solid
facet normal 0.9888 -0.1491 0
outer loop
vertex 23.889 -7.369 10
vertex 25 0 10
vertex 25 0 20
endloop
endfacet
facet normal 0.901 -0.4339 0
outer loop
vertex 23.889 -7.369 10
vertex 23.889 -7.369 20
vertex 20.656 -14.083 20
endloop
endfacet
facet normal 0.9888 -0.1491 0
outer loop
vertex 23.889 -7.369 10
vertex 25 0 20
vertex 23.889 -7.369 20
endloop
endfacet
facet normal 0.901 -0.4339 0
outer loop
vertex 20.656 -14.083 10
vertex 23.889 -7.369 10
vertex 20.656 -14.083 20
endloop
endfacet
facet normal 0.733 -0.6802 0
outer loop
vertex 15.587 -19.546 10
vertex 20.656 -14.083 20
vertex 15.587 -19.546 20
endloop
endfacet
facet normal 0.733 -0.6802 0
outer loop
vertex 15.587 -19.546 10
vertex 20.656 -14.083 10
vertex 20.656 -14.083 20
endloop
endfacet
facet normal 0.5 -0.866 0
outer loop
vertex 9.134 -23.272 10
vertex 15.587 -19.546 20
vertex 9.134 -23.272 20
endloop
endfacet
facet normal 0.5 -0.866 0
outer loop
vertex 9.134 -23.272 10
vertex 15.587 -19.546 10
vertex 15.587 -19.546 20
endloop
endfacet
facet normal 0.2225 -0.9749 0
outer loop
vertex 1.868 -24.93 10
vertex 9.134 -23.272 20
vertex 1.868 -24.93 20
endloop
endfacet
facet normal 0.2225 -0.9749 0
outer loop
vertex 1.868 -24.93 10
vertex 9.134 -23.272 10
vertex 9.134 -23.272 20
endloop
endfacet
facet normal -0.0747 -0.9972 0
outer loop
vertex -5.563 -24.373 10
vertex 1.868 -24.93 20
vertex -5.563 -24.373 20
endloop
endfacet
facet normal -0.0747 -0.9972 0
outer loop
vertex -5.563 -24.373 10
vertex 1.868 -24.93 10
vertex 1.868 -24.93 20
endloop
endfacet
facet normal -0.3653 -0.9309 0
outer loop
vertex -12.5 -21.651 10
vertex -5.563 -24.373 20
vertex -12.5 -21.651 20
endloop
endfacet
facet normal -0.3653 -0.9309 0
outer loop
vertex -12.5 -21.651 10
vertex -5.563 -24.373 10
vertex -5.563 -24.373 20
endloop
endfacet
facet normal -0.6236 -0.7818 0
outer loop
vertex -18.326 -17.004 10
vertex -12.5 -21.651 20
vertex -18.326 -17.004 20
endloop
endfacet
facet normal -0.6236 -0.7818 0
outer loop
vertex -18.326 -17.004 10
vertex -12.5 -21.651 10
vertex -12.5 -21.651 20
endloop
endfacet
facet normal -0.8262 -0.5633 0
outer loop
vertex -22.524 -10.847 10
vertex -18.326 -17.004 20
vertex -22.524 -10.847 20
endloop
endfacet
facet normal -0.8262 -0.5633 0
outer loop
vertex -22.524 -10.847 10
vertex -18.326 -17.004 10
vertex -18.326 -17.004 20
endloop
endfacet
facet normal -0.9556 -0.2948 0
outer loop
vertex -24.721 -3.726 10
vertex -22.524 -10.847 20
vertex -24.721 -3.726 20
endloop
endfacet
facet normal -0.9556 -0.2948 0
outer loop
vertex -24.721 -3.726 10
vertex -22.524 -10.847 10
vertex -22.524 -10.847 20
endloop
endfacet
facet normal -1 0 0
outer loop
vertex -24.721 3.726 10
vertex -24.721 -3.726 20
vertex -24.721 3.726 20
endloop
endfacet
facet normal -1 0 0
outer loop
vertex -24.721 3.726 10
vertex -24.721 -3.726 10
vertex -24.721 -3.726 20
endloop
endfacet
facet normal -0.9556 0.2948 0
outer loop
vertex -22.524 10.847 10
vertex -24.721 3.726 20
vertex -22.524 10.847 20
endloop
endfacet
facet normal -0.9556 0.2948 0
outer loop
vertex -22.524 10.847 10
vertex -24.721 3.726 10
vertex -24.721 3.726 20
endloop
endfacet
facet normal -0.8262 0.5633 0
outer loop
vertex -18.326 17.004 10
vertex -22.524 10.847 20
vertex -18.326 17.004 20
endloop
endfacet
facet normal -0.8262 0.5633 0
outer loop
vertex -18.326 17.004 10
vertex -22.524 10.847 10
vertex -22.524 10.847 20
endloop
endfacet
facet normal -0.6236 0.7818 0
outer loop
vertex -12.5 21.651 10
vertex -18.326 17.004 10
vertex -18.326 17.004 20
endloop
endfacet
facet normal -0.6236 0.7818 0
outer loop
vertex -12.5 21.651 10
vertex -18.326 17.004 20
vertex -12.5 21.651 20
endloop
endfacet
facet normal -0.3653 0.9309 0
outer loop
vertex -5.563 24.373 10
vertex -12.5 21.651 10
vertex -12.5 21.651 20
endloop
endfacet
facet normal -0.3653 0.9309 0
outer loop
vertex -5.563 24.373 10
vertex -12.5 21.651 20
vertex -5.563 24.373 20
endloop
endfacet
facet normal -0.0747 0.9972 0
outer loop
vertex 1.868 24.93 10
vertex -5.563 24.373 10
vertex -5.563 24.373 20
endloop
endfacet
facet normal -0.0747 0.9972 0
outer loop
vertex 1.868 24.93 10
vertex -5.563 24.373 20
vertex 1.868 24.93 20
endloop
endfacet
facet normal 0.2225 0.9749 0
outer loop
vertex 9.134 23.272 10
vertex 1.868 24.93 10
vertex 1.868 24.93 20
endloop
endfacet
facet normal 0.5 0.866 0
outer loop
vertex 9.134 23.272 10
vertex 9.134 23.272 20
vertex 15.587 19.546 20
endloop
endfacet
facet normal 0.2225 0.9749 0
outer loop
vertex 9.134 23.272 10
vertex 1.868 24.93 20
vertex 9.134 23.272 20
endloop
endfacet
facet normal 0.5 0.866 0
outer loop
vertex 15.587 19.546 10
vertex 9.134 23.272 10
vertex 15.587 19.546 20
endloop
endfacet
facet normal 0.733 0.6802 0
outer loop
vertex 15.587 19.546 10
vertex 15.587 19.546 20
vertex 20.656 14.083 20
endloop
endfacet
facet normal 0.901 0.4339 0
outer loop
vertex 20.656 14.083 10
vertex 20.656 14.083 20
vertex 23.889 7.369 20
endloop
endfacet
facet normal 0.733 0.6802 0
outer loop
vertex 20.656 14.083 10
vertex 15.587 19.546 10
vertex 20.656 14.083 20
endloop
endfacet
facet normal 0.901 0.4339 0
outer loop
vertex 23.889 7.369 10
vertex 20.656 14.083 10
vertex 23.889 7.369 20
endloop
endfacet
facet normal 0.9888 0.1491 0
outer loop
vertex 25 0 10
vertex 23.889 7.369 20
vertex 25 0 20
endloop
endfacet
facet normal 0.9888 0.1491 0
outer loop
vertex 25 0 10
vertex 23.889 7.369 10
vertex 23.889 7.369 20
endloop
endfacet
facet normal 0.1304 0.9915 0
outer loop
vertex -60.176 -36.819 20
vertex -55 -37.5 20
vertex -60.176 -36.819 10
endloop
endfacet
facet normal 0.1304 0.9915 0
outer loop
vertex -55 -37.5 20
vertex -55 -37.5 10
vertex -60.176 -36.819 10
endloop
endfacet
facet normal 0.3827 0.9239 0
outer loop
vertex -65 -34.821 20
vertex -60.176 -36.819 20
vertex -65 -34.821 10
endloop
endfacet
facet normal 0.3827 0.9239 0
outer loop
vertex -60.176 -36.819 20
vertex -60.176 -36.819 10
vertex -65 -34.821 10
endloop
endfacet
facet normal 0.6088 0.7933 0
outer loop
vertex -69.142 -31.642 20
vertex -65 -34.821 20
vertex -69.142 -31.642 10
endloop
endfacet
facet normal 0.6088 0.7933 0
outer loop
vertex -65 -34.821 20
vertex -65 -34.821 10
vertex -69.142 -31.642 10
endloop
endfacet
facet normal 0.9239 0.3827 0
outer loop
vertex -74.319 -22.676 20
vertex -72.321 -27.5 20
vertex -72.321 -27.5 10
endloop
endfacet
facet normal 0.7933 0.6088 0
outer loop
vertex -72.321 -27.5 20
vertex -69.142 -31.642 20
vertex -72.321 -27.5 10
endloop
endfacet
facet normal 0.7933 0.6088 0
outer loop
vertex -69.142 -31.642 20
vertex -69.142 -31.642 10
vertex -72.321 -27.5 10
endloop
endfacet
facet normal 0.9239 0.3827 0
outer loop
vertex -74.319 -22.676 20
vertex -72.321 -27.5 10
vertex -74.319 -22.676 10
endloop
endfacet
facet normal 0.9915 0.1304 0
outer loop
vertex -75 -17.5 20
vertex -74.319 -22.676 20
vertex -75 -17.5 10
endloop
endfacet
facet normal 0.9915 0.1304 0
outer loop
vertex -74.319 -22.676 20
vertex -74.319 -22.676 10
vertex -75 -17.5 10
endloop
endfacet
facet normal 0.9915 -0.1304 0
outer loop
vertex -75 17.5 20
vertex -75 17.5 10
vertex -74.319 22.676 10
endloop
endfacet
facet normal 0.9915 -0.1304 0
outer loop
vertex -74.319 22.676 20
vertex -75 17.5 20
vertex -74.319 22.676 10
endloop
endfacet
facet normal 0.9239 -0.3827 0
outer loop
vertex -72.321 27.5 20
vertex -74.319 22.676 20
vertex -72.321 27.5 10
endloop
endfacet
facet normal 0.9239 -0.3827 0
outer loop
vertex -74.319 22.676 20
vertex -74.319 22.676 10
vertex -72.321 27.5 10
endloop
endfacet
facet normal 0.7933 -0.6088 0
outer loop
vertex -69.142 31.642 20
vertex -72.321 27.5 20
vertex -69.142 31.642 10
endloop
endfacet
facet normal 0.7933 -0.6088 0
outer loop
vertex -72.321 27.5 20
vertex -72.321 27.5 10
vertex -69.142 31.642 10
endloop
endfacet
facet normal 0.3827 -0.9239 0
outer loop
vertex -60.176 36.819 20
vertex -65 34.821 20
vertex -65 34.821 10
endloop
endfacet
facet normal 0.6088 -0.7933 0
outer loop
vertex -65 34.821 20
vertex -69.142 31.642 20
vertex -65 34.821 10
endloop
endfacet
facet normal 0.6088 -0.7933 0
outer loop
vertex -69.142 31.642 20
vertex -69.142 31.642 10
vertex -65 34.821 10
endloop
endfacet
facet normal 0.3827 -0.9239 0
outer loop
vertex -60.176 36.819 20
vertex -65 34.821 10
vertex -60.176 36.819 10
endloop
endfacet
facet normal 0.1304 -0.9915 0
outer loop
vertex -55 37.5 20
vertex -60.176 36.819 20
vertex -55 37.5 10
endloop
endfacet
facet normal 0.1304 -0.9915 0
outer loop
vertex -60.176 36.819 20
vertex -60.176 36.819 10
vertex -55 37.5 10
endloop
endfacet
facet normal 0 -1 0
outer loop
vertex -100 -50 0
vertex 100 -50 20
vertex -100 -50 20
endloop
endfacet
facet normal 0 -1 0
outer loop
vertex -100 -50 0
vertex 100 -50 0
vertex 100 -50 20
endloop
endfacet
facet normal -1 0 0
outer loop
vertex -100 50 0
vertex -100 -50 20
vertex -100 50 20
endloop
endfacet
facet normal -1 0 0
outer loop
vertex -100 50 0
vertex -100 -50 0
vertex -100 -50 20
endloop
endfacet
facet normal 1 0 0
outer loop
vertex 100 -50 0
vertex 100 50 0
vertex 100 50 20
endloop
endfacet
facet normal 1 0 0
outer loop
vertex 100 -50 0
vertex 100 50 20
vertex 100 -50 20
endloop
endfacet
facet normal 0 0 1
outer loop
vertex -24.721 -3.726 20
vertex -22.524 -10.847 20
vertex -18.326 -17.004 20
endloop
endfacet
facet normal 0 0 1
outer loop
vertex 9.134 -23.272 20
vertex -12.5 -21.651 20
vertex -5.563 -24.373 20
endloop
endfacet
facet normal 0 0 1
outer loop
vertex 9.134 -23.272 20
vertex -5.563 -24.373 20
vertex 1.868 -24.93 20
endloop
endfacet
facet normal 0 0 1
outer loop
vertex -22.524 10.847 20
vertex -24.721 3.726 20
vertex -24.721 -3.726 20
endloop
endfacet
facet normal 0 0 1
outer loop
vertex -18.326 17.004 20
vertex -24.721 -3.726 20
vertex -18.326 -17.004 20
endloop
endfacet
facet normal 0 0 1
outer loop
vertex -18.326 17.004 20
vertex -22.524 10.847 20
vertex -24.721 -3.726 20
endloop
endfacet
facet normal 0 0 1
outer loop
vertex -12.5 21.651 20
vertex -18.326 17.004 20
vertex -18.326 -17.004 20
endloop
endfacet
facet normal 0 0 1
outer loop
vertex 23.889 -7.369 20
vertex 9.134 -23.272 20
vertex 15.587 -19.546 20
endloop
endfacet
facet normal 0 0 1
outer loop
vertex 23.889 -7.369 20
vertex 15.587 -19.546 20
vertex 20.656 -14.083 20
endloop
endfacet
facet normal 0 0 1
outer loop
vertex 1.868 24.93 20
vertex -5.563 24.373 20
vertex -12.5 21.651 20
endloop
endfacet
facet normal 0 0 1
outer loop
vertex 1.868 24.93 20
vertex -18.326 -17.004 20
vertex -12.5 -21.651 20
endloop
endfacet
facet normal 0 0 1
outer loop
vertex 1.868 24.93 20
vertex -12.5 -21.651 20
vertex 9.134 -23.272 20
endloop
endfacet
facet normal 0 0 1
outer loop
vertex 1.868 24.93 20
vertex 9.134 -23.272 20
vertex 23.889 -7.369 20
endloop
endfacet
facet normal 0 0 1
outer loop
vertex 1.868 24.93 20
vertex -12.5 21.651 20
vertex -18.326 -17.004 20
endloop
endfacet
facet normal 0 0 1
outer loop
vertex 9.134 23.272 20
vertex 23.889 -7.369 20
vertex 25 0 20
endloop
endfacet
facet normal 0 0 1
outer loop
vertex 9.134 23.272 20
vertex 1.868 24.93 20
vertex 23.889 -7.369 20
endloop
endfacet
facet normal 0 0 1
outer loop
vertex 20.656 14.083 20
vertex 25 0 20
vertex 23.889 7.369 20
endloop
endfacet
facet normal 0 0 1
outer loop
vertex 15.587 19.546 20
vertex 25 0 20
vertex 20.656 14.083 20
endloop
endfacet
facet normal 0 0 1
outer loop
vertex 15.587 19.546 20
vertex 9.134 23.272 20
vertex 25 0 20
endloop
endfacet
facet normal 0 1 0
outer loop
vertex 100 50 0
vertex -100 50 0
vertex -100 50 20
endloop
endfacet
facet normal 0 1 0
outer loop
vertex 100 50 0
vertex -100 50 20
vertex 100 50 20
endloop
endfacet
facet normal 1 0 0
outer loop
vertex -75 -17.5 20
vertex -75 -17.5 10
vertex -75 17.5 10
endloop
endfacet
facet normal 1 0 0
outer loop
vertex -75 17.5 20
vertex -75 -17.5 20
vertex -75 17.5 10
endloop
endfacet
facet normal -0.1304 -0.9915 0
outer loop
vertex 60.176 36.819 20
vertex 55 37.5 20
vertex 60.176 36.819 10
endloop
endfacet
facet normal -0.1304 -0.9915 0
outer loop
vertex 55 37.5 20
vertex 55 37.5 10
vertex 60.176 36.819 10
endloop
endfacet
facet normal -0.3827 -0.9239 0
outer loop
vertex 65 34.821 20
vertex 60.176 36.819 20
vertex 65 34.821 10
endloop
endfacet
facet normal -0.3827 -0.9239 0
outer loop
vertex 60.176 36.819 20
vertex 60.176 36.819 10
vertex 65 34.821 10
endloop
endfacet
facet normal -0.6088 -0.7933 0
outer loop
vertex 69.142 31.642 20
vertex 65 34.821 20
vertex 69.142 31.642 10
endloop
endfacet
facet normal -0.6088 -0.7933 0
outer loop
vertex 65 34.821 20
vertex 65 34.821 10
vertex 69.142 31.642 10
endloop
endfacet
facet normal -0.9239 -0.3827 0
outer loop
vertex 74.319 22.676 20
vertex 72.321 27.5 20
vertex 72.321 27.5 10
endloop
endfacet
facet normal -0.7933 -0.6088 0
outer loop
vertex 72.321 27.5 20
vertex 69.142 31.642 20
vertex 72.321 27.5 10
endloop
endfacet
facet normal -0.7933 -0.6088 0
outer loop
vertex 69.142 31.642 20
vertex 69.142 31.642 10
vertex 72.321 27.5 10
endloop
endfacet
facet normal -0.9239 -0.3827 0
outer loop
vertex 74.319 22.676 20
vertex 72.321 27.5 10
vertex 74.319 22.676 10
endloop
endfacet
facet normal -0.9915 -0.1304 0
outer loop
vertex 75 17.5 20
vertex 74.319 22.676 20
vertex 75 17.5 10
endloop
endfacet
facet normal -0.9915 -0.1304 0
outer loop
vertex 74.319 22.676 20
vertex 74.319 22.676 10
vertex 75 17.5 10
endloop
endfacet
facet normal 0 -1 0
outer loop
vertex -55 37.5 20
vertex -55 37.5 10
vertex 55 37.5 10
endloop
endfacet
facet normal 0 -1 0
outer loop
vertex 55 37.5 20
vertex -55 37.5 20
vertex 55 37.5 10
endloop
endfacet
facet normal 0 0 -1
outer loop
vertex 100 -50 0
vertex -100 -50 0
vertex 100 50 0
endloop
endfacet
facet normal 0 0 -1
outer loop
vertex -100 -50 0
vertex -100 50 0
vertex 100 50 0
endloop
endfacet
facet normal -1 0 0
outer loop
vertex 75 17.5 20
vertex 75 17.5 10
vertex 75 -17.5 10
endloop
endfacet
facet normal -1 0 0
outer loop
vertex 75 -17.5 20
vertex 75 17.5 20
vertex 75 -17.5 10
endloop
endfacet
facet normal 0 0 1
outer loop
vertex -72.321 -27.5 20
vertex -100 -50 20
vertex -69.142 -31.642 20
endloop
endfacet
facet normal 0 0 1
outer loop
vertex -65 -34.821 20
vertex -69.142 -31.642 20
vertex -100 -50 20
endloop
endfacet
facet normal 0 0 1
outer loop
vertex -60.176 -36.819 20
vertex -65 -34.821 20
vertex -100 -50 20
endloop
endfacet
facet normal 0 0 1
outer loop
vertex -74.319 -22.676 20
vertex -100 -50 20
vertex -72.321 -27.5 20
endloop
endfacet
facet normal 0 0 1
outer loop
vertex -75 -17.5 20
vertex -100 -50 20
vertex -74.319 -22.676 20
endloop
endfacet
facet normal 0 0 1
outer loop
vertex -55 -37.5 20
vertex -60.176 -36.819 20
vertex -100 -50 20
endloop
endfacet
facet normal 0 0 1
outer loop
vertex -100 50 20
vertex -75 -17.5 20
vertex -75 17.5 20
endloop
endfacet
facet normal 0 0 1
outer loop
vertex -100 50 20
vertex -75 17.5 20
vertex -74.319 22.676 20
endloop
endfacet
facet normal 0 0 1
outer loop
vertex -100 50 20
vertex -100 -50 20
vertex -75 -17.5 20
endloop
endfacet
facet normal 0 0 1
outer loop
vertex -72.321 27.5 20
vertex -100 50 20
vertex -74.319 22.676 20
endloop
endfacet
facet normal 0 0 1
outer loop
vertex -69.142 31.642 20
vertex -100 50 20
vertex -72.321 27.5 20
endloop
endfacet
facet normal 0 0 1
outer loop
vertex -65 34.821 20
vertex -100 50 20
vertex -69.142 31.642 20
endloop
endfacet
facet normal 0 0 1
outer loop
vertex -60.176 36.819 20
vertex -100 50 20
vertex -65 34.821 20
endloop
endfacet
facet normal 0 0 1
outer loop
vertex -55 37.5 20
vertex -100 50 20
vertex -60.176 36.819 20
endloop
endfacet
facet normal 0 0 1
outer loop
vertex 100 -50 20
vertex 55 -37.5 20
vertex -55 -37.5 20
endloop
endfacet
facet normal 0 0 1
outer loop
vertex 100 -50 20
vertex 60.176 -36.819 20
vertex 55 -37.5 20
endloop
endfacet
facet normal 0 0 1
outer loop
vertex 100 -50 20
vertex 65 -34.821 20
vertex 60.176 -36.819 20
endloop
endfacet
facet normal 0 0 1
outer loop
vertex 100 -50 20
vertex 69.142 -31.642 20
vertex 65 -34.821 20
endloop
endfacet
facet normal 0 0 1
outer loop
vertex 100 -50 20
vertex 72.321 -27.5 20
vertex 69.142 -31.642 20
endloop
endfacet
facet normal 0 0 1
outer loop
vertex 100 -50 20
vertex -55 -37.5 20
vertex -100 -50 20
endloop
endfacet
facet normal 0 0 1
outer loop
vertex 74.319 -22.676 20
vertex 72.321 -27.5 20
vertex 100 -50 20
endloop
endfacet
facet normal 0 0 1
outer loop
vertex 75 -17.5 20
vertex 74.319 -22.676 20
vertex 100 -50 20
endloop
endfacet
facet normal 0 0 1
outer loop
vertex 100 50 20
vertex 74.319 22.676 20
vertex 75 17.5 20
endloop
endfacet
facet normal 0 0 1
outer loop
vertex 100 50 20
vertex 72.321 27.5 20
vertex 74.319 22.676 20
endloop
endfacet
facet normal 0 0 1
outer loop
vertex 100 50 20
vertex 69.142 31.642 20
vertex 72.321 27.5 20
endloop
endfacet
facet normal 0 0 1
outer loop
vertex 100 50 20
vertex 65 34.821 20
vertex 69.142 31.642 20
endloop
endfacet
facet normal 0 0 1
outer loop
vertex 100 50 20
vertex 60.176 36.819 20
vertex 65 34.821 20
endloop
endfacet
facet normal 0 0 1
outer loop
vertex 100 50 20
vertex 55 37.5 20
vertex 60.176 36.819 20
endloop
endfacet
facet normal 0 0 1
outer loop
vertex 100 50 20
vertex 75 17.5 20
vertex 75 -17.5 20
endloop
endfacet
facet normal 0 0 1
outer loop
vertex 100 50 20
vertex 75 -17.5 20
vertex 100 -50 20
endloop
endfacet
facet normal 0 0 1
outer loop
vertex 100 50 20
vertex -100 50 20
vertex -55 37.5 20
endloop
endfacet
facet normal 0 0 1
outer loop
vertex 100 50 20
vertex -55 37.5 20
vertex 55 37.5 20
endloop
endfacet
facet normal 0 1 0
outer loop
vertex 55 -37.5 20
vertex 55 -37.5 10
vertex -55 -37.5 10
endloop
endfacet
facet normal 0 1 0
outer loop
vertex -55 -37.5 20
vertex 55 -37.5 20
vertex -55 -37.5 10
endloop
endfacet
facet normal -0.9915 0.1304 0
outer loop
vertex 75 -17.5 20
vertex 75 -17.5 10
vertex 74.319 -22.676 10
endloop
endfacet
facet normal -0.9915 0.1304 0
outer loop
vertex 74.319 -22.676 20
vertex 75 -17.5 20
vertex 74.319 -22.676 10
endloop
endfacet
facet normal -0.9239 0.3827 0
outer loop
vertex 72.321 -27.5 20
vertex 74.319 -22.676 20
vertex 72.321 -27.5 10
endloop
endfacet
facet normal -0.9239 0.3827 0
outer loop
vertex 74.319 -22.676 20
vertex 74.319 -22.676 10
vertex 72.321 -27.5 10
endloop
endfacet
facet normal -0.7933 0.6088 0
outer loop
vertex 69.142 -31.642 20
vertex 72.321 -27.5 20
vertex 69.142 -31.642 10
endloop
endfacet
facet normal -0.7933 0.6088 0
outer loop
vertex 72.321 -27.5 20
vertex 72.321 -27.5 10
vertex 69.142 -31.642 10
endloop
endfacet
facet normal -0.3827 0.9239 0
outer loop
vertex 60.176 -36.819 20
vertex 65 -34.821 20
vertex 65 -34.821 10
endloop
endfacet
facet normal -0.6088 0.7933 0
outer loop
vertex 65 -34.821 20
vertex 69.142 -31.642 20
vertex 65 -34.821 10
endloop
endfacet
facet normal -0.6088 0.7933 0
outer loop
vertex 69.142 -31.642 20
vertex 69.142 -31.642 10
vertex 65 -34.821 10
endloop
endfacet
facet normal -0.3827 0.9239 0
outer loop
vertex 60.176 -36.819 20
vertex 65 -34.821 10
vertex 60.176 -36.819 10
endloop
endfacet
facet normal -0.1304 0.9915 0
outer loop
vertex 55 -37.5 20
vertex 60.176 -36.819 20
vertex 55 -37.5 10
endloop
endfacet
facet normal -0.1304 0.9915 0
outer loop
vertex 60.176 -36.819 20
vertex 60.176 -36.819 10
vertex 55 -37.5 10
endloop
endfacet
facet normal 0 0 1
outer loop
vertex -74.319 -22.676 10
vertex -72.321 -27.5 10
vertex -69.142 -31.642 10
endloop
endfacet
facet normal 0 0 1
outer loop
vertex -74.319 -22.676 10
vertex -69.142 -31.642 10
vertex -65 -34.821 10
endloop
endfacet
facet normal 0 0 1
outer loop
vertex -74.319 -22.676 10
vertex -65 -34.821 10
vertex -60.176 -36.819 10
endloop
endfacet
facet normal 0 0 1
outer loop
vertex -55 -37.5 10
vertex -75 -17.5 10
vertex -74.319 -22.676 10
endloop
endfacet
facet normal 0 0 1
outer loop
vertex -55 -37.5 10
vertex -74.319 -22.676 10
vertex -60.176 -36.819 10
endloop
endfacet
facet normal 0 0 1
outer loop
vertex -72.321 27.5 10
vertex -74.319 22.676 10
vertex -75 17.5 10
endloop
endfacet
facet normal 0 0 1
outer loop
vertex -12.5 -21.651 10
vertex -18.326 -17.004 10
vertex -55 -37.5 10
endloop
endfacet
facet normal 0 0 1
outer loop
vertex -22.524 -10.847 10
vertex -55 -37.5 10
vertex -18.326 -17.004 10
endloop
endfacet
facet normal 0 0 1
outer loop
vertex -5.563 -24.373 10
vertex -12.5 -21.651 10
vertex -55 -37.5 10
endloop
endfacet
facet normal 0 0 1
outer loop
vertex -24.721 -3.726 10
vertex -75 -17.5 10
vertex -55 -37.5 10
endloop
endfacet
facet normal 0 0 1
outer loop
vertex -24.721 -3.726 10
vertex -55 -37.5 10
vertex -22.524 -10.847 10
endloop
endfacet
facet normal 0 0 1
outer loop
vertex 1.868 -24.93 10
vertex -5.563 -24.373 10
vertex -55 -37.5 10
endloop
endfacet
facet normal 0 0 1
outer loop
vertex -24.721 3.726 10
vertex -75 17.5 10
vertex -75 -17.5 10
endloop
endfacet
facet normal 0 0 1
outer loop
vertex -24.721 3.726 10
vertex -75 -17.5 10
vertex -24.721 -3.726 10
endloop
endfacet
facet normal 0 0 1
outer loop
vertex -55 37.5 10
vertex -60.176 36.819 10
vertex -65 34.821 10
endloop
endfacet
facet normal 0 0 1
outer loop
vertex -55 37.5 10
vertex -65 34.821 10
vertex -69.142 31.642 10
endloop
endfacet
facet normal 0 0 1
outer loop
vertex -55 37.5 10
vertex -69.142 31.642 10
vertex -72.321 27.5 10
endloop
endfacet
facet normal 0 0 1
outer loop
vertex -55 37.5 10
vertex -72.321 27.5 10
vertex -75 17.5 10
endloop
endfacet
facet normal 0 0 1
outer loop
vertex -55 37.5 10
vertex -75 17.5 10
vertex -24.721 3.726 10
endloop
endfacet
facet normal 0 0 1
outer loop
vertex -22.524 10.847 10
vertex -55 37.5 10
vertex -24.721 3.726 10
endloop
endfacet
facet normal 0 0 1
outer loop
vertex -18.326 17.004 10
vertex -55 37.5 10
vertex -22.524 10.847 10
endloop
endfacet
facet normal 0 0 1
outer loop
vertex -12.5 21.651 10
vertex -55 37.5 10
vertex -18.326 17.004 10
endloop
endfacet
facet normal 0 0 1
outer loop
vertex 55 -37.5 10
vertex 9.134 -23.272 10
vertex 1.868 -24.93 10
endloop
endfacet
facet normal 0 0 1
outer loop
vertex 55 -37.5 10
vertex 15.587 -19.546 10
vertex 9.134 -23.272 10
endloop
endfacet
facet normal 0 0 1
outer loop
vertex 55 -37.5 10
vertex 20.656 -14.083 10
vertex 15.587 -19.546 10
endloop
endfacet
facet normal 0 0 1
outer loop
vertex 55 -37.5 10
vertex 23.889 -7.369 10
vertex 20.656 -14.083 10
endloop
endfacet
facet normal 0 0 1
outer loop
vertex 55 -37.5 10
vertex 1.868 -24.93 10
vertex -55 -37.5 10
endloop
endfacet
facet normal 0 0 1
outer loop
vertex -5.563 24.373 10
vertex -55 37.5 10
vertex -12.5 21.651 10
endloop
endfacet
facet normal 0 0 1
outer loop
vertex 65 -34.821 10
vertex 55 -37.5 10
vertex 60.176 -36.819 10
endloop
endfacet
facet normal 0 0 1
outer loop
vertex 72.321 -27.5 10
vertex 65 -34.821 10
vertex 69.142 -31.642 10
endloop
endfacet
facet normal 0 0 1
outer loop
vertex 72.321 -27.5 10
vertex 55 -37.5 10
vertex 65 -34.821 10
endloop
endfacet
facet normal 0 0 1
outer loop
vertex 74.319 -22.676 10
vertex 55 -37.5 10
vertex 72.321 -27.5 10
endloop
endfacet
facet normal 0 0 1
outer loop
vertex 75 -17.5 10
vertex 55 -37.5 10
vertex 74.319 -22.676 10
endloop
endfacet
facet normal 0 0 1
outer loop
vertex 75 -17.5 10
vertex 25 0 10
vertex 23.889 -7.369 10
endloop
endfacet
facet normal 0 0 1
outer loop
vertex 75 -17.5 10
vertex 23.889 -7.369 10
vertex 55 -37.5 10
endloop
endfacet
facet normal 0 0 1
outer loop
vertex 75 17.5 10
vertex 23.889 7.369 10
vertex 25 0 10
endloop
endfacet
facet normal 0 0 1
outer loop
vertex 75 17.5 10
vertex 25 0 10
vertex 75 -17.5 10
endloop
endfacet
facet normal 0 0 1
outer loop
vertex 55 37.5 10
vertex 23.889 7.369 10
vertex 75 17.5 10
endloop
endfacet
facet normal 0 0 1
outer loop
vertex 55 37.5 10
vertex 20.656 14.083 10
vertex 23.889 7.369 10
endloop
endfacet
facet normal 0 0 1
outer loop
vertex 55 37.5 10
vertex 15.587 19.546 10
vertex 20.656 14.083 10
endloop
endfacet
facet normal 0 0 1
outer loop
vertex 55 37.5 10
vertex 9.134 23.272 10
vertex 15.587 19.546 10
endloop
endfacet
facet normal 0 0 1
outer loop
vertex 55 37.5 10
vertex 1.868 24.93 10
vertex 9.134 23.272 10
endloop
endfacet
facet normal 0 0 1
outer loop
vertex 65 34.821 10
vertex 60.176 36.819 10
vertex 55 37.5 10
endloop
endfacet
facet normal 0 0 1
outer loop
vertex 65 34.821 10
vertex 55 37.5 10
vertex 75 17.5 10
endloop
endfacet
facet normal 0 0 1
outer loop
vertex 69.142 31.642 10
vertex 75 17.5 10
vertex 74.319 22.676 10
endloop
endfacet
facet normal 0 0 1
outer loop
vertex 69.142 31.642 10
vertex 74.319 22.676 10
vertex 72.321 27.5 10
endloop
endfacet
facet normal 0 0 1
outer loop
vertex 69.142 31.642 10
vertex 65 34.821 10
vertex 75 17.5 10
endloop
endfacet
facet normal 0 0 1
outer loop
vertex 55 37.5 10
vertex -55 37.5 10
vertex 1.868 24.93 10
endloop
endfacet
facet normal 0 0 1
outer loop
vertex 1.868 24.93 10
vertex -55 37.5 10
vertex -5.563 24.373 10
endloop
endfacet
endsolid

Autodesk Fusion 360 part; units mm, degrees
sketch "Sketch1" plane through (0, 0, 0) normal (0, 0, 1) x (1, 0, 0)
  line L0 (-100, 50) -> (100, 50)
  line L1 (100, 50) -> (100, -50)
  line L2 (100, -50) -> (-100, -50)
  line L3 (-100, -50) -> (-100, 50)
  line L4 (-100, 50) -> (100, -50) construction
  line L5 (100, 50) -> (-100, -50) construction
  line L6 (-55, 37.5) -> (55, 37.5)
  line L7 (75, 17.5) -> (75, -17.5)
  line L8 (55, -37.5) -> (-55, -37.5)
  line L9 (-75, -17.5) -> (-75, 17.5)
  line L10 (-75, 37.5) -> (75, -37.5) construction
  line L11 (75, 37.5) -> (-75, -37.5) construction
  arc A0 (-55, 37.5) -> (-75, 17.5) centre (-55, 17.5) ccw
  arc A1 (-75, -17.5) -> (-55, -37.5) centre (-55, -17.5) ccw
  arc A2 (55, -37.5) -> (75, -17.5) centre (55, -17.5) ccw
  arc A3 (75, 17.5) -> (55, 37.5) centre (55, 17.5) ccw
  circle A4 centre (0, 0) radius 25
  dimension "d1" = 200
  dimension "d2" = 100
  dimension "d3" = 150
  dimension "d4" = 75
  dimension "d5" = 20
  dimension "d6" = 20
  dimension "d7" = 50
extrude "Extrude1" add sketch "Sketch1" along normal blind 20 contours L0 L1 L2 L3
extrude "Extrude2" add sketch "Sketch1" along normal blind 10 contours L6 L7 L8 L9 A0 A1 A2 A3
extrude "Extrude3" add sketch "Sketch1" along normal blind 20 contours A4
